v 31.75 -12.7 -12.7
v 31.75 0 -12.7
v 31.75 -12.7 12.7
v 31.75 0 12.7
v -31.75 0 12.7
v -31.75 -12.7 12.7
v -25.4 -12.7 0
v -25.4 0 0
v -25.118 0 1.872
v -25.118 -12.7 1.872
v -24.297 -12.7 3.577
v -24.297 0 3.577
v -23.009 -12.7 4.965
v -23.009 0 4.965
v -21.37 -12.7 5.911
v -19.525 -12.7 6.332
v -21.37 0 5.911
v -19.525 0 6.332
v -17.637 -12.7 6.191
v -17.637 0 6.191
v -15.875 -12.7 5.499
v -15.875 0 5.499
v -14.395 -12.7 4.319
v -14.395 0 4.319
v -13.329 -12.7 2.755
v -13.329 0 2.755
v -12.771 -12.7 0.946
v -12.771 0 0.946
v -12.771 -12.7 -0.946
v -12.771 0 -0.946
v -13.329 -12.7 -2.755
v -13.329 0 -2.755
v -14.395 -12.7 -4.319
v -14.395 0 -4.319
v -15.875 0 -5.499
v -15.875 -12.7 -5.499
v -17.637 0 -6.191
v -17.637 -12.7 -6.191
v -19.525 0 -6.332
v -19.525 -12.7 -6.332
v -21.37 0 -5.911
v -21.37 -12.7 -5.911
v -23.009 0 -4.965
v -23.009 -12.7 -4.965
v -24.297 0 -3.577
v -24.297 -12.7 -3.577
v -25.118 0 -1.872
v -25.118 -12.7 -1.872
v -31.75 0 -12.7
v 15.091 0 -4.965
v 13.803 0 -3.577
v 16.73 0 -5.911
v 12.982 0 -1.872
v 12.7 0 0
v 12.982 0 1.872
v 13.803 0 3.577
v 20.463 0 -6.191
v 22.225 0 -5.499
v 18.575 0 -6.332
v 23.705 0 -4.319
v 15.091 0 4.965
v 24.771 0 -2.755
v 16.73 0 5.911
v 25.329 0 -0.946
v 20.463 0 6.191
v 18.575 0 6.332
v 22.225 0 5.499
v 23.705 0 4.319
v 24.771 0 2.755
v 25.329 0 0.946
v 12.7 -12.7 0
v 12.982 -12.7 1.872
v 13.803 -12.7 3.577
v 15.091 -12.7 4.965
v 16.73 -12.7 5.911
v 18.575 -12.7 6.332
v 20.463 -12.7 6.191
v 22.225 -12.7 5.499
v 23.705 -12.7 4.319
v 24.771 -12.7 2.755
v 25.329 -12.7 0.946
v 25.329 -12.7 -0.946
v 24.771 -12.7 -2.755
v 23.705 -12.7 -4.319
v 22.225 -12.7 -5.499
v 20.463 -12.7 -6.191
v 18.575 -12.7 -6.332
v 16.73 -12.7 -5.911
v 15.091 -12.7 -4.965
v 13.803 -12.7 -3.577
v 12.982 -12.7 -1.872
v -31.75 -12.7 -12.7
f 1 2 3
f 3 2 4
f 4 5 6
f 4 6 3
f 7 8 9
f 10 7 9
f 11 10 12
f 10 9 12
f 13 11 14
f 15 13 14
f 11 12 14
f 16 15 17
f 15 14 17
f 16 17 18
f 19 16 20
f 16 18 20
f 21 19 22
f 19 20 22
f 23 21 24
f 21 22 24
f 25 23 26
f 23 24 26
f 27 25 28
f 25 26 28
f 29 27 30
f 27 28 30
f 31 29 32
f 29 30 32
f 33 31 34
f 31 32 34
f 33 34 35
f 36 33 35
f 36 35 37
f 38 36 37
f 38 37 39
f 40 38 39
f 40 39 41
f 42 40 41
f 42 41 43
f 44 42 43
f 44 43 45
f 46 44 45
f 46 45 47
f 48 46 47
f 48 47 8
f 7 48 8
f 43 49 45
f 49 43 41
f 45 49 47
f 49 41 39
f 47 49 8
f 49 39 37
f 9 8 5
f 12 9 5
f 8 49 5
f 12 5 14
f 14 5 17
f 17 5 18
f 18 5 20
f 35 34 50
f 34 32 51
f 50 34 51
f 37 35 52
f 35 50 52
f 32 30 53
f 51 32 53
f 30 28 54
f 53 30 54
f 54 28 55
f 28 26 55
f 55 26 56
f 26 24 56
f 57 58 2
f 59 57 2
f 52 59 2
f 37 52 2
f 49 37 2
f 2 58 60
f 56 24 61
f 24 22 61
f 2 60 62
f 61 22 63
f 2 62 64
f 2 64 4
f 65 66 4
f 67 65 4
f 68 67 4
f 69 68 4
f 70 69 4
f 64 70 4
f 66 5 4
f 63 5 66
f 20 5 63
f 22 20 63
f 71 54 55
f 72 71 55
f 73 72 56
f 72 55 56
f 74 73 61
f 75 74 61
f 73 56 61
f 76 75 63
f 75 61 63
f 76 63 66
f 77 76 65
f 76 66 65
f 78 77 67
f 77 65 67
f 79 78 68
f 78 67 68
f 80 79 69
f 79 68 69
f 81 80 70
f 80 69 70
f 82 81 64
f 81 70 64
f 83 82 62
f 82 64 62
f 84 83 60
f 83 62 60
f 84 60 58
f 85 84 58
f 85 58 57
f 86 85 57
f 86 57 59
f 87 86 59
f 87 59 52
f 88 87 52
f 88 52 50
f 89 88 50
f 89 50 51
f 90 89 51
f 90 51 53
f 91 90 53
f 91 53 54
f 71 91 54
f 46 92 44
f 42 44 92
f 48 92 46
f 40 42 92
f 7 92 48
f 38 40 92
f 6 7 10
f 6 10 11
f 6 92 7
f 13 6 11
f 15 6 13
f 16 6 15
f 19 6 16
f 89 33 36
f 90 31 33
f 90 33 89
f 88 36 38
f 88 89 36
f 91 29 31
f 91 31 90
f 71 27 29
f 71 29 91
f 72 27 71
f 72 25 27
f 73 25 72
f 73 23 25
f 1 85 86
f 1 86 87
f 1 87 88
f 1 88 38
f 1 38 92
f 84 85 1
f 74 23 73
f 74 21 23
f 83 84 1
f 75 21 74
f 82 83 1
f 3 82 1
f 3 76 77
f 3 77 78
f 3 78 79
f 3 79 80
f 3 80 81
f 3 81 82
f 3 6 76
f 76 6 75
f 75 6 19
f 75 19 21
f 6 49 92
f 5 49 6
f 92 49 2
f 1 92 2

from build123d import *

# Parameters (mm, degrees)
F0_W     = 63.5
F0_H     = 25.4
F1_DEPTH = 12.7
F3_D     = 12.7


# Not quite as in the source:
# - a length typed as a fraction of an inch, garbled in the dataset ("3 / 203.2 mm" for 3/8 in), is restored


with BuildPart() as f1:
    # F0 (on Front) → F1 (new body)
    with BuildSketch(Plane.XZ):
        Rectangle(F0_W, F0_H)
    extrude(amount=F1_DEPTH)

    # F3 (through all)
    with Locations(Plane.XZ.offset(12.7)):
        with Locations((-19.05, 0), (19.05, 0)):
            Hole(F3_D / 2)


solid = f1.part
